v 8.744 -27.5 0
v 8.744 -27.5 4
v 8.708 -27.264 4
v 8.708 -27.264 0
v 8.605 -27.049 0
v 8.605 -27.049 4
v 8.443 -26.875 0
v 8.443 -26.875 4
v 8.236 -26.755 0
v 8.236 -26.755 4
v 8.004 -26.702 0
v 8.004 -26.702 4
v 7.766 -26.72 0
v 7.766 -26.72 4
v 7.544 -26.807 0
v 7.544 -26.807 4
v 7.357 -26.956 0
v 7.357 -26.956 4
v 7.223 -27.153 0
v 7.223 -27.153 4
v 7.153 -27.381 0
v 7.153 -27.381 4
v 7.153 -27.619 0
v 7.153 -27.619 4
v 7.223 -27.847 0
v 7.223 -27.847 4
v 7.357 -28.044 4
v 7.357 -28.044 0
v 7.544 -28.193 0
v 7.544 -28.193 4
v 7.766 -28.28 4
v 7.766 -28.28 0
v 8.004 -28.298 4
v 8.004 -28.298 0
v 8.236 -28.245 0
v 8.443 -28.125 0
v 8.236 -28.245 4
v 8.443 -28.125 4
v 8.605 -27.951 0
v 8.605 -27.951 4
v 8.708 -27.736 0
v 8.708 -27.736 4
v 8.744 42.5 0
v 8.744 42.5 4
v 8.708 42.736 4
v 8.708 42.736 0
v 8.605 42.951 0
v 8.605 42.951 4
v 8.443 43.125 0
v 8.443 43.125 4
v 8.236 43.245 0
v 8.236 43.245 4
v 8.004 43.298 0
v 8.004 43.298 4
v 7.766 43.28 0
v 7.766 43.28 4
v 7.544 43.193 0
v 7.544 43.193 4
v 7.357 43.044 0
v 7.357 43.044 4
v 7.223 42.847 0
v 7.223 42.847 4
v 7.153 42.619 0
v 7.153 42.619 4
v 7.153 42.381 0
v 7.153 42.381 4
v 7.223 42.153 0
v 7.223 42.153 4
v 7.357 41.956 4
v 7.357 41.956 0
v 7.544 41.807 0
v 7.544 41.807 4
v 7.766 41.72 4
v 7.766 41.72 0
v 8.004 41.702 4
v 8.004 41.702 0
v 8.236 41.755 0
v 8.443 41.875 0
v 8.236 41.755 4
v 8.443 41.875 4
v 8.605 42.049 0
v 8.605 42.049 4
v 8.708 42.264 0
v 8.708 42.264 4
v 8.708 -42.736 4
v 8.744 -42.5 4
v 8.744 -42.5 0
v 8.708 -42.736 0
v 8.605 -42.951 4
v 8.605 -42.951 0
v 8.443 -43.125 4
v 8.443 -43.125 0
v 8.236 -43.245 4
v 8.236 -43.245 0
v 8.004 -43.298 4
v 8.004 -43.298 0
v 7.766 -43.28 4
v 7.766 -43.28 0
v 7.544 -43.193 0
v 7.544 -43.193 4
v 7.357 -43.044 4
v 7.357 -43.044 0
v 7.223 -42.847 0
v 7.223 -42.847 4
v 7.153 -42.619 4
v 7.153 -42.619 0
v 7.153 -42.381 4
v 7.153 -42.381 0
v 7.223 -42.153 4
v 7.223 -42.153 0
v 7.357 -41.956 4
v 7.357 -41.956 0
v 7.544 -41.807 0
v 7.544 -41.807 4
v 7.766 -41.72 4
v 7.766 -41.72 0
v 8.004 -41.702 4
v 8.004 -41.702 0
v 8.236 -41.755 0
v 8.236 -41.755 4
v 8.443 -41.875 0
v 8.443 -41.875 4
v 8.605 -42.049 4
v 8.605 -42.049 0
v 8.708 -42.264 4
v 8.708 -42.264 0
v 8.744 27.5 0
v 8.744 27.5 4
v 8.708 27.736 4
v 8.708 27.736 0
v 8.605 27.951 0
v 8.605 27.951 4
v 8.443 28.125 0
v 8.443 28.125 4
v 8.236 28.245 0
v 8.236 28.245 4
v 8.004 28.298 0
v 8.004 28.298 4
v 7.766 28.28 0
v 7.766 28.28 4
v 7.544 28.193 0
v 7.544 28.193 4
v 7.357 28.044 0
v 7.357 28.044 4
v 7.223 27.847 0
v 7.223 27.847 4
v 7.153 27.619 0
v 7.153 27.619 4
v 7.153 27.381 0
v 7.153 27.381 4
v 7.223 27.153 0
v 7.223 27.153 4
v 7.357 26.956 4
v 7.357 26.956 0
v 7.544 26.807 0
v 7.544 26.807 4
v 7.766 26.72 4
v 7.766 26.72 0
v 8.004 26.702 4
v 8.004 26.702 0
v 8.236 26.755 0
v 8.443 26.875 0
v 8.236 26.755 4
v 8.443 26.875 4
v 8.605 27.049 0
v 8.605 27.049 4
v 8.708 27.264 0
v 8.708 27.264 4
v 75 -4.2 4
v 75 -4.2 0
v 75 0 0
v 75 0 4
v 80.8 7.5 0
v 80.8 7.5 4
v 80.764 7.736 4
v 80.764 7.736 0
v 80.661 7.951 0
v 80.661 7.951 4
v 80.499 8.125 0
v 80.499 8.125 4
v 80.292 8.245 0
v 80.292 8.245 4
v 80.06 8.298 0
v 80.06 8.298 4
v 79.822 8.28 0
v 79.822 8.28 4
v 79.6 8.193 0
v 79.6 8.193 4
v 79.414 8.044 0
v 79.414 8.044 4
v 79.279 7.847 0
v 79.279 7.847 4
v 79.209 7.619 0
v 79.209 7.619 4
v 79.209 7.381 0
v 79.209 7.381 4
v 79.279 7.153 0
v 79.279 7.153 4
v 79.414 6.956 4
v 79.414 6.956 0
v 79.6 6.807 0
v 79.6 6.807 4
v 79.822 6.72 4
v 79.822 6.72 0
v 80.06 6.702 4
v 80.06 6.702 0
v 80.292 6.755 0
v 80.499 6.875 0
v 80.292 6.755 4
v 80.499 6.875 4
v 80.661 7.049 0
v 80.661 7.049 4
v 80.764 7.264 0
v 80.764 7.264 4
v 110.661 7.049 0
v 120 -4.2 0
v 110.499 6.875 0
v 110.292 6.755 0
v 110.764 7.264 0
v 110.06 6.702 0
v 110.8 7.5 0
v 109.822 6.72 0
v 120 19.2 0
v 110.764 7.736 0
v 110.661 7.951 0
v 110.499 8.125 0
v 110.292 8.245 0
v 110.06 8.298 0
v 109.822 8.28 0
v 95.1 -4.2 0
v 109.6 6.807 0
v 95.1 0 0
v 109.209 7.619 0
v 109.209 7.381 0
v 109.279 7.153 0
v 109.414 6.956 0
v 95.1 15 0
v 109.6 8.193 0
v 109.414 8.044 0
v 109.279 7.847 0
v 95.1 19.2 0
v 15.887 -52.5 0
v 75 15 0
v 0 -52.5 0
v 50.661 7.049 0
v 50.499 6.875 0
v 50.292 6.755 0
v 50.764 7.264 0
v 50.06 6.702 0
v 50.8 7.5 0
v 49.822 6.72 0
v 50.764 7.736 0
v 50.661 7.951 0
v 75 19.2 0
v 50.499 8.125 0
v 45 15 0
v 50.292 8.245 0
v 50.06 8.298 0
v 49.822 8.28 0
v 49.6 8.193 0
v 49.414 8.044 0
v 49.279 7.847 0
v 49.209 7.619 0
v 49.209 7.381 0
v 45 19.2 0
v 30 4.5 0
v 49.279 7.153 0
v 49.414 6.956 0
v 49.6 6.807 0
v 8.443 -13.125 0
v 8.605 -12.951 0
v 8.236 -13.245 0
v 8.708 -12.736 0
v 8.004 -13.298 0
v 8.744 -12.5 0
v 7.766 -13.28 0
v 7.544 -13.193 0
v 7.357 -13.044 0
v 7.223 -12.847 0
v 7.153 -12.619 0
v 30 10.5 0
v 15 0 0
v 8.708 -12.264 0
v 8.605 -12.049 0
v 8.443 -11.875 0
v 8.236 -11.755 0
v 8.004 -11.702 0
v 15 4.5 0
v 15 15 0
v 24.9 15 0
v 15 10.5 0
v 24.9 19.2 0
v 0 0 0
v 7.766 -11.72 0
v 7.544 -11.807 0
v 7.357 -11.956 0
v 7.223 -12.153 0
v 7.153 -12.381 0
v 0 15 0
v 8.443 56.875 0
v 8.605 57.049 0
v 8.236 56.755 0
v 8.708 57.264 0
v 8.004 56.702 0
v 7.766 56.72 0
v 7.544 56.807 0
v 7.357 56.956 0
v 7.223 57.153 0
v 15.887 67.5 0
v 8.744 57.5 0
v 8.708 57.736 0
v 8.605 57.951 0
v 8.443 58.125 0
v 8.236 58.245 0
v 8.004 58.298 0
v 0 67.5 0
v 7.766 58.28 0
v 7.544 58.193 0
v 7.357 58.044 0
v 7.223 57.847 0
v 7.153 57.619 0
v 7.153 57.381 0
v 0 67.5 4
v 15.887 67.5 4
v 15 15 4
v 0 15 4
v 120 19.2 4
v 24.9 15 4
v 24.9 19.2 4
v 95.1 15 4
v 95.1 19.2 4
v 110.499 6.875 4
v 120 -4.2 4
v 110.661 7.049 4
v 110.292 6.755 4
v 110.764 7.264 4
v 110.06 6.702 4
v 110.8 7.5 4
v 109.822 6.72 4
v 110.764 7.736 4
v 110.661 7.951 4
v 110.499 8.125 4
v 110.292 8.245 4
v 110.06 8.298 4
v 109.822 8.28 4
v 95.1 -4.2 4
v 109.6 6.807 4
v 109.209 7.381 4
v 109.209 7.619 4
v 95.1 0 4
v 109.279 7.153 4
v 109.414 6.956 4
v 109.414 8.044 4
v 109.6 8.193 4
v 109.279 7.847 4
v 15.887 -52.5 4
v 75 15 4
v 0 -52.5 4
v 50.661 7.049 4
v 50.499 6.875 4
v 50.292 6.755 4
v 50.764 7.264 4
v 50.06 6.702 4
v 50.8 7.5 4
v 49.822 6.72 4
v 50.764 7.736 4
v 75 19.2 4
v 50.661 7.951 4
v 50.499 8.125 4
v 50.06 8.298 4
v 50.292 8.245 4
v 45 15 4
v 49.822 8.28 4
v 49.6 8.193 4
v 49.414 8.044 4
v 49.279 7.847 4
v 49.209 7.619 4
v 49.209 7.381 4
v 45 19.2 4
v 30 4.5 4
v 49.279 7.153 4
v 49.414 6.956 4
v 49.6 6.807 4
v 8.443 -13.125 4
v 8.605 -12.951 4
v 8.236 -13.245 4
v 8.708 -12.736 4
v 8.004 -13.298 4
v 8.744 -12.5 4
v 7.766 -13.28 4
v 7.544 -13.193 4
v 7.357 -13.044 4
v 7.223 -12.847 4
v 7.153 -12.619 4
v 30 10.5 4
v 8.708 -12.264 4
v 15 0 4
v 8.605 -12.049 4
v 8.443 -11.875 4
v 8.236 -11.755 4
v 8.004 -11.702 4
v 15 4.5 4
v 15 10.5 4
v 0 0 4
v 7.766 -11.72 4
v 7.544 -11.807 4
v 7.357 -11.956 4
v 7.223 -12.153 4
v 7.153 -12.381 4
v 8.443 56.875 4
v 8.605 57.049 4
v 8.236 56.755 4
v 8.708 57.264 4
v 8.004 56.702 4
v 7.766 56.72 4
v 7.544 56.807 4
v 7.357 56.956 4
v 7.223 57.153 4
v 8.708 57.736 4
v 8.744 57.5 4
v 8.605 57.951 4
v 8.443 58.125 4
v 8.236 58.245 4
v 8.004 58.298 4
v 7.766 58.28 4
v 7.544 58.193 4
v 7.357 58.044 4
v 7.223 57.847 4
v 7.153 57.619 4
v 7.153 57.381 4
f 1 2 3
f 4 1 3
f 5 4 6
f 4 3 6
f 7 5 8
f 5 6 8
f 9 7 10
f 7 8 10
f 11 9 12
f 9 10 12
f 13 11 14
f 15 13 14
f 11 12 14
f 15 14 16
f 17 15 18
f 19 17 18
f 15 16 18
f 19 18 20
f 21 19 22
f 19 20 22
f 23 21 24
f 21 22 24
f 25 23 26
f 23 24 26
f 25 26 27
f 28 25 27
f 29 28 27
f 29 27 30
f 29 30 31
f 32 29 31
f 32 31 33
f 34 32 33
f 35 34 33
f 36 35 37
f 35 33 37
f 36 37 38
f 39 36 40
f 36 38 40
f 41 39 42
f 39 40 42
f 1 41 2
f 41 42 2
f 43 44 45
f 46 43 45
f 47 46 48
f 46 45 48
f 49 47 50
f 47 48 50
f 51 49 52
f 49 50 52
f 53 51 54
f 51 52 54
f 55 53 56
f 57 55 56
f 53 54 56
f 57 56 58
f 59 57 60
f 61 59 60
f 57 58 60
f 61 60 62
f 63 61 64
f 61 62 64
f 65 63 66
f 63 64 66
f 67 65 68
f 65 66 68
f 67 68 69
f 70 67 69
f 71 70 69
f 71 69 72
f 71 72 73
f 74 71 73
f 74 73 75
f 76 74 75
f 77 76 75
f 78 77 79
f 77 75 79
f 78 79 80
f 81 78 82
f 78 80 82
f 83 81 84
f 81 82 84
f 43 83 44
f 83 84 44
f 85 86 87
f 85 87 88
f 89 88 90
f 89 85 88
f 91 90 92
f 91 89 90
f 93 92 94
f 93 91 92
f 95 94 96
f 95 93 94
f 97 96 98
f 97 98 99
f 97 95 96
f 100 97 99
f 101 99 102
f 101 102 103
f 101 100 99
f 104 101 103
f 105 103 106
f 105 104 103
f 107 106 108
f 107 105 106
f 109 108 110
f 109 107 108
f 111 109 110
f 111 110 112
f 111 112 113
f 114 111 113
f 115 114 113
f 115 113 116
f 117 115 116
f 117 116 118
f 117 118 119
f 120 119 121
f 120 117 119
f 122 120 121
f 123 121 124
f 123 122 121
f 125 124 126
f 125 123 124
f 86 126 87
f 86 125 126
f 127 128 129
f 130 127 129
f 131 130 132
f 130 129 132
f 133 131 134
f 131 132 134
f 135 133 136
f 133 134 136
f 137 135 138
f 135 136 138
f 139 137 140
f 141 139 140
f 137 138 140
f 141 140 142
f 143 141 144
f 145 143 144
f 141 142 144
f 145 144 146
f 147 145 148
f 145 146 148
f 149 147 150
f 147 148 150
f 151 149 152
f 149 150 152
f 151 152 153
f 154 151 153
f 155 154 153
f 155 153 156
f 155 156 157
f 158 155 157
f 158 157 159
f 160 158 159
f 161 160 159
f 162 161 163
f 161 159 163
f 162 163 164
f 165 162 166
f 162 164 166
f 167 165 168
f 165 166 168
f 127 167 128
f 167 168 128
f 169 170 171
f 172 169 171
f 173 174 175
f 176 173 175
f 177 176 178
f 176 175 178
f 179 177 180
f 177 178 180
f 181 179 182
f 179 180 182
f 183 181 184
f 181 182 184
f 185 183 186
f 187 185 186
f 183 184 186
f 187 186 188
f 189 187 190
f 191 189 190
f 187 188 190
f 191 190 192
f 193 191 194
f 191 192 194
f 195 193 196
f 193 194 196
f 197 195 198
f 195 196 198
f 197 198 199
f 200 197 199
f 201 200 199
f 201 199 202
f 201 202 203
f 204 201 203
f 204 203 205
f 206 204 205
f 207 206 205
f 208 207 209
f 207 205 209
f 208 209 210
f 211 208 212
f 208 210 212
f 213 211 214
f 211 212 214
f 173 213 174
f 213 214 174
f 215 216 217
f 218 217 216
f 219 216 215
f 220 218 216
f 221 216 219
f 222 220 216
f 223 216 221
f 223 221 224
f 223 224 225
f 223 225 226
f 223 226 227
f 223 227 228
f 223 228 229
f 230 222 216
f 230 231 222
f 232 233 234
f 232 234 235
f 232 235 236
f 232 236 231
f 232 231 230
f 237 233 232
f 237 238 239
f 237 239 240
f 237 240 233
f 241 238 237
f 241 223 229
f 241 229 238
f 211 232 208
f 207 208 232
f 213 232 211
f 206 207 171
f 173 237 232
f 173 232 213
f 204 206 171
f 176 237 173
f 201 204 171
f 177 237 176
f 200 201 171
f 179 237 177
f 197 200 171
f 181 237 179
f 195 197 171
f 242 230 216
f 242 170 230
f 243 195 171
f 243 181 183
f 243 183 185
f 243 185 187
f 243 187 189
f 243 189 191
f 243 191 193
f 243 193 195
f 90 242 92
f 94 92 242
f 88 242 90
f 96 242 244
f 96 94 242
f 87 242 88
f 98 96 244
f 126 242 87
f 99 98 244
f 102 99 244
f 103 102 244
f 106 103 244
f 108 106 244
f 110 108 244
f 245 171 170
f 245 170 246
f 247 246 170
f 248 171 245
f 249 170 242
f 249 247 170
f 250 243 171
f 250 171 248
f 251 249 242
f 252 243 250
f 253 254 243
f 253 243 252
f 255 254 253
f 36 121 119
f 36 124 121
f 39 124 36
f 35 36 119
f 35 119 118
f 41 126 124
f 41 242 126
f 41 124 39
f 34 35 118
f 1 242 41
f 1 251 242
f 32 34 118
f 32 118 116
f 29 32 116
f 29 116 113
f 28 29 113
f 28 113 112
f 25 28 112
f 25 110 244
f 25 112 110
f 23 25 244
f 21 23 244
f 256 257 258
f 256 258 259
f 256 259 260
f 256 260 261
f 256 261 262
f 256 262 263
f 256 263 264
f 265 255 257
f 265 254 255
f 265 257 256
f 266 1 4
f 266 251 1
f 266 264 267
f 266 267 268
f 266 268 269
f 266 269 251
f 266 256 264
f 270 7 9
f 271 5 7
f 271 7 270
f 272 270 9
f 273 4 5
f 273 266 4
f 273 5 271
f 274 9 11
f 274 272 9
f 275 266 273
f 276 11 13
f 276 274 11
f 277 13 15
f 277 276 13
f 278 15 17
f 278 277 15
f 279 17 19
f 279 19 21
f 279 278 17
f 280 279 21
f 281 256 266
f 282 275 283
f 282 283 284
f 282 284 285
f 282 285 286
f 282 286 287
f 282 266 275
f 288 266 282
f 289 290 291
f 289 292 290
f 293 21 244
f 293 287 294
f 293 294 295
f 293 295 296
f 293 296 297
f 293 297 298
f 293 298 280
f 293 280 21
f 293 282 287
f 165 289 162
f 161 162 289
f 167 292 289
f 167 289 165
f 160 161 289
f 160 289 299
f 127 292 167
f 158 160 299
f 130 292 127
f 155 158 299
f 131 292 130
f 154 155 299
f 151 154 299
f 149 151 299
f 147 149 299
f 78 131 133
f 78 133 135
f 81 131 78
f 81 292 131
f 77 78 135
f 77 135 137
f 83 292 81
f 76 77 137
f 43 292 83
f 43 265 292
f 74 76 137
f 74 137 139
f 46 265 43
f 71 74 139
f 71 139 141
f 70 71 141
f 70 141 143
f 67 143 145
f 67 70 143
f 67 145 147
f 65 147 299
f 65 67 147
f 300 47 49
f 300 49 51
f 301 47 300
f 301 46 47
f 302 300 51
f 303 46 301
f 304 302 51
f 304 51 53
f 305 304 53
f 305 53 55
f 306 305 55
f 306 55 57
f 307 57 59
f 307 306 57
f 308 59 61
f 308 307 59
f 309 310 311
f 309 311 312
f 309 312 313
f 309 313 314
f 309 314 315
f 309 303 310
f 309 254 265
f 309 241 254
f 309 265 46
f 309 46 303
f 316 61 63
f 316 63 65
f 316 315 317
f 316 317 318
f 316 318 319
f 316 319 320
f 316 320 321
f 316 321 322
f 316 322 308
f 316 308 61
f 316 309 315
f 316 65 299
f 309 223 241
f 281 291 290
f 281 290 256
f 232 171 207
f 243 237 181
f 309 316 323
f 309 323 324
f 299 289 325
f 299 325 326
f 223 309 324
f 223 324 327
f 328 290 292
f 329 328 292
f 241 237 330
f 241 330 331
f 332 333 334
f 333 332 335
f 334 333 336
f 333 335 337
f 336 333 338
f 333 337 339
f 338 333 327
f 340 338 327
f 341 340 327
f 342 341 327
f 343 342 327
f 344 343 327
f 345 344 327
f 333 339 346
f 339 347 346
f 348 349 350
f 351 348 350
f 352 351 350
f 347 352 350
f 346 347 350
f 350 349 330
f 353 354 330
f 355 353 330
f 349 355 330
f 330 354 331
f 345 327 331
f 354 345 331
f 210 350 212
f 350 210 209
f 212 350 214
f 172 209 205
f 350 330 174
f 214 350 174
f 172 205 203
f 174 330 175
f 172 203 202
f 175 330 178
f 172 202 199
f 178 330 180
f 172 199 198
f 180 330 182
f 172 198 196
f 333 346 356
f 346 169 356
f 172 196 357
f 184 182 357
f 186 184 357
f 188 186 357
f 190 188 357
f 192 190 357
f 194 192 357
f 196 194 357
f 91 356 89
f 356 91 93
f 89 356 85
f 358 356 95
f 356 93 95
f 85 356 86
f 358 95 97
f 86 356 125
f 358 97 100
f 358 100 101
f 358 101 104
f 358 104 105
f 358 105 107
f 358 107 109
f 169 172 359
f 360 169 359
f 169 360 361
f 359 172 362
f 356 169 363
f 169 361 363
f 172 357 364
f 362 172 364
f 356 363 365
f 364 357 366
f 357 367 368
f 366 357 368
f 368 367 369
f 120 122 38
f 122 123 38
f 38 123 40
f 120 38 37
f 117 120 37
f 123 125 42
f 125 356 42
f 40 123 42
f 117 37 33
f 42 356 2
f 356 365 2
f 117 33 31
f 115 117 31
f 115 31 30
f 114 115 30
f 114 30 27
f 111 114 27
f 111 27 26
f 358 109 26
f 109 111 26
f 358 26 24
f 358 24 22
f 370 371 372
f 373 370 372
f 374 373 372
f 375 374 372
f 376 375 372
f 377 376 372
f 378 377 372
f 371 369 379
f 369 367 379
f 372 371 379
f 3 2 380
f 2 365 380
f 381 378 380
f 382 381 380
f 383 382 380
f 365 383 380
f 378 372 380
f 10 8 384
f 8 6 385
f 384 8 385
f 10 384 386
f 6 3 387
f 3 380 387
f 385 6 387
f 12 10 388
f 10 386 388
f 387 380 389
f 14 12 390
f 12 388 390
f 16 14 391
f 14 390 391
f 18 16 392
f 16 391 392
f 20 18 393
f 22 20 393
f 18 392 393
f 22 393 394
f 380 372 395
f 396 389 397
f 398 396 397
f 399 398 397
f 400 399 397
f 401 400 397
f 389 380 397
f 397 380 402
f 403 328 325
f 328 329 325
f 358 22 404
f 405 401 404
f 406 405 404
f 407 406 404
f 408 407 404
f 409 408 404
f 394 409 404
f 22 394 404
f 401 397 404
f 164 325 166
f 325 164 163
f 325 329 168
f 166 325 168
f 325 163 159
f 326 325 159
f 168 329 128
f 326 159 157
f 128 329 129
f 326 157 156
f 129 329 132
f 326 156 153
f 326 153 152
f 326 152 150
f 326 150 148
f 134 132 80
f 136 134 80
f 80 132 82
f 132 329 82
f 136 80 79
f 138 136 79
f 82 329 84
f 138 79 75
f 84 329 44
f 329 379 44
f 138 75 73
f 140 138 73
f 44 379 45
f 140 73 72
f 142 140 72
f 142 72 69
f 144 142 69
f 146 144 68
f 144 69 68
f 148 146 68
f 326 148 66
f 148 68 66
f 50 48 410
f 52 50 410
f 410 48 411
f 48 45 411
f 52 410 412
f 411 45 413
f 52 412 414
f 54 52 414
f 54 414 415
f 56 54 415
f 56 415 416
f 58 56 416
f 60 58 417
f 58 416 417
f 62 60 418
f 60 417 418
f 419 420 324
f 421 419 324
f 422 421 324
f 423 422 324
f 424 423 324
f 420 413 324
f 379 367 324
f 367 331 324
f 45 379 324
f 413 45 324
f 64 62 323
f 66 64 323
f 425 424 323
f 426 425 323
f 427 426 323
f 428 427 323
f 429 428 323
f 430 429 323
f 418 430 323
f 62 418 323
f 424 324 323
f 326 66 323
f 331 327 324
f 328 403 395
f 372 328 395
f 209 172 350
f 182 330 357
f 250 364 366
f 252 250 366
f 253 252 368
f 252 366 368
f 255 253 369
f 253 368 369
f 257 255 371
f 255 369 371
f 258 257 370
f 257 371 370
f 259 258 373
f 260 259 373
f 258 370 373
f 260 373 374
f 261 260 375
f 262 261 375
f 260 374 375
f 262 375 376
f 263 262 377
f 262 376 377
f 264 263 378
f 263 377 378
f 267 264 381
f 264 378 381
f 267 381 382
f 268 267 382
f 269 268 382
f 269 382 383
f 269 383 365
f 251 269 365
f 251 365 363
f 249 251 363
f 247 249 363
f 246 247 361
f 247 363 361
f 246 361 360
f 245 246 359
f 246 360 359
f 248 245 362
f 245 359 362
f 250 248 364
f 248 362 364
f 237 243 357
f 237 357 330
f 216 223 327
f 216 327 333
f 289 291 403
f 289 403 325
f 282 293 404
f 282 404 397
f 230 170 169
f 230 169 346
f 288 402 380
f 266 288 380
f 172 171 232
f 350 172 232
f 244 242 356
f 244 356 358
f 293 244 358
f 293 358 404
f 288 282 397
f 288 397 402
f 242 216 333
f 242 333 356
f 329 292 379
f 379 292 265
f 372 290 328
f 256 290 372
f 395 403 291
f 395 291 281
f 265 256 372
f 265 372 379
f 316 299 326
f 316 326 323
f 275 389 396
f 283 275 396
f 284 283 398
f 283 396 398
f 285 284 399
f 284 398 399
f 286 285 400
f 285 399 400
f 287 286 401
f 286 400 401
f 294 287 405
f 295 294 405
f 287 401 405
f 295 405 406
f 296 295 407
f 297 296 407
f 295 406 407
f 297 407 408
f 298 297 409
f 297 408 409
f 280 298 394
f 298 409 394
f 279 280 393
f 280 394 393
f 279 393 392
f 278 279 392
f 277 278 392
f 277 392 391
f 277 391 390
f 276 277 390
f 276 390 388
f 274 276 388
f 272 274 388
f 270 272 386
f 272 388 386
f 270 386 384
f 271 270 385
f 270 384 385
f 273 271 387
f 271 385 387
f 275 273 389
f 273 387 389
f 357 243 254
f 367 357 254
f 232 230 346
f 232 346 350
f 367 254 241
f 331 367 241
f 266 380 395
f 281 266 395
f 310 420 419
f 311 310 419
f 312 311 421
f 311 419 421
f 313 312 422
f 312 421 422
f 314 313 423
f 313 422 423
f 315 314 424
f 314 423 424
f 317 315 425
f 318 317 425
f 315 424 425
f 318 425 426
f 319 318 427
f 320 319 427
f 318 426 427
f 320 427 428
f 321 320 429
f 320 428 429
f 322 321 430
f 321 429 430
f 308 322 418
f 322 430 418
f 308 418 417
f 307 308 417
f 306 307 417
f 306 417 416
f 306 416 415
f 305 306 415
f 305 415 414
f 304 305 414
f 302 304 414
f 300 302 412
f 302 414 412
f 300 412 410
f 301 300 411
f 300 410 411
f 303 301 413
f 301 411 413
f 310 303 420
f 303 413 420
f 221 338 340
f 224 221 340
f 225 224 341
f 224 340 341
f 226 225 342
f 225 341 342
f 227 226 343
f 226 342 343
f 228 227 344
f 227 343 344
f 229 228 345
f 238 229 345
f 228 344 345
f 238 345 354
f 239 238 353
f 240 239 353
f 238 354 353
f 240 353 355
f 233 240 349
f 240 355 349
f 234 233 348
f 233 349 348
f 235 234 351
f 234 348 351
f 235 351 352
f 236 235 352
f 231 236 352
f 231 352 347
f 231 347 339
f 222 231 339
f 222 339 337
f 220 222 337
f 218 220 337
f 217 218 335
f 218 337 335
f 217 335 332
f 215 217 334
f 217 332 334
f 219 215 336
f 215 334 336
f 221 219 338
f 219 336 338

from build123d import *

# Parameters (mm, degrees)
SKETCH1_W               = 20.1
SKETCH1_H               = 4.2
BOSS_EXTRUDE1_DEPTH     = 4
SKETCH2_R               = 0.8
CUT_EXTRUDE1_DEPTH      = 4
LPATTERN2_COUNT         = 3
LPATTERN2_PITCH         = 15
MIRROR1_COPY_1_SKETCH_R = 0.8
MIRROR1_COPY_1_DEPTH    = 4
MIRROR1_COPY_2_SKETCH_R = 0.8
MIRROR1_COPY_2_DEPTH    = 4
MIRROR1_COPY_3_SKETCH_R = 0.8
MIRROR1_COPY_3_DEPTH    = 4
SKETCH2_4_R             = 0.8
CUT_EXTRUDE3_DEPTH      = 4
LPATTERN3_COUNT         = 5
LPATTERN3_PITCH         = 30
SKETCH3_W               = 15
SKETCH3_H               = 6
CUT_EXTRUDE4_DEPTH      = 4


with BuildPart() as part:
    # Sketch1 → Boss-Extrude1 (new body)
    with BuildSketch(Plane.XY):
        Polygon((0, 15), (0, 67.5), (15.887452938, 67.5), (120, 19.2), (120, -4.2), (15.887452938, -52.5), (0, -52.5), (0, 0), (15, 0), (15, 15), align=None)
        with Locations((85.05, -2.1)):
            Rectangle(SKETCH1_W, SKETCH1_H, mode=Mode.SUBTRACT)
        with Locations((85.05, 17.1)):
            Rectangle(SKETCH1_W, SKETCH1_H, mode=Mode.SUBTRACT)
        with Locations((34.95, 17.1)):
            Rectangle(SKETCH1_W, SKETCH1_H, mode=Mode.SUBTRACT)
    extrude(amount=BOSS_EXTRUDE1_DEPTH)

    # Sketch2 → Cut-Extrude1 (cut)
    with BuildSketch(Plane.XY.offset(4)):
        with Locations((7.943726469, 57.5)):
            Circle(SKETCH2_R)
    cut_extrude1 = extrude(amount=-CUT_EXTRUDE1_DEPTH, mode=Mode.SUBTRACT)

    # LPattern2: Cut-Extrude1 ×3
    with Locations(*[(0, -i * LPATTERN2_PITCH, 0) for i in range(1, LPATTERN2_COUNT)]):
        add(cut_extrude1, mode=Mode.SUBTRACT)

    # Mirror1 copy 1 sketch → Mirror1 copy 1 (cut)
    with BuildSketch(Plane(origin=(0, 30, 4), x_dir=(1, 0, 0), z_dir=(0, 0, 1))):
        with Locations((7.943726469, -57.5)):
            Circle(MIRROR1_COPY_1_SKETCH_R)
    extrude(amount=-MIRROR1_COPY_1_DEPTH, mode=Mode.SUBTRACT)

    # Mirror1 copy 2 sketch → Mirror1 copy 2 (cut)
    with BuildSketch(Plane(origin=(0, 45, 4), x_dir=(1, 0, 0), z_dir=(0, 0, 1))):
        with Locations((7.943726469, -57.5)):
            Circle(MIRROR1_COPY_2_SKETCH_R)
    extrude(amount=-MIRROR1_COPY_2_DEPTH, mode=Mode.SUBTRACT)

    # Mirror1 copy 3 sketch → Mirror1 copy 3 (cut)
    with BuildSketch(Plane(origin=(0, 15, 4), x_dir=(1, 0, 0), z_dir=(0, 0, 1))):
        with Locations((7.943726469, -57.5)):
            Circle(MIRROR1_COPY_3_SKETCH_R)
    extrude(amount=-MIRROR1_COPY_3_DEPTH, mode=Mode.SUBTRACT)

    # Sketch2<4> → Cut-Extrude3 (cut)
    with BuildSketch(Plane.XY.offset(4)):
        with Locations((110, 7.5)):
            Circle(SKETCH2_4_R)
    cut_extrude3 = extrude(amount=-CUT_EXTRUDE3_DEPTH, mode=Mode.SUBTRACT)

    # LPattern3: Cut-Extrude3 ×5
    with Locations(*[(-i * LPATTERN3_PITCH, 0, 0) for i in range(1, LPATTERN3_COUNT)]):
        add(cut_extrude3, mode=Mode.SUBTRACT)

    # Sketch3 → Cut-Extrude4 (cut)
    with BuildSketch(Plane.XY.offset(4)):
        with Locations((22.5, 7.5)):
            Rectangle(SKETCH3_W, SKETCH3_H)
    extrude(amount=-CUT_EXTRUDE4_DEPTH, mode=Mode.SUBTRACT)


solid = part.part
